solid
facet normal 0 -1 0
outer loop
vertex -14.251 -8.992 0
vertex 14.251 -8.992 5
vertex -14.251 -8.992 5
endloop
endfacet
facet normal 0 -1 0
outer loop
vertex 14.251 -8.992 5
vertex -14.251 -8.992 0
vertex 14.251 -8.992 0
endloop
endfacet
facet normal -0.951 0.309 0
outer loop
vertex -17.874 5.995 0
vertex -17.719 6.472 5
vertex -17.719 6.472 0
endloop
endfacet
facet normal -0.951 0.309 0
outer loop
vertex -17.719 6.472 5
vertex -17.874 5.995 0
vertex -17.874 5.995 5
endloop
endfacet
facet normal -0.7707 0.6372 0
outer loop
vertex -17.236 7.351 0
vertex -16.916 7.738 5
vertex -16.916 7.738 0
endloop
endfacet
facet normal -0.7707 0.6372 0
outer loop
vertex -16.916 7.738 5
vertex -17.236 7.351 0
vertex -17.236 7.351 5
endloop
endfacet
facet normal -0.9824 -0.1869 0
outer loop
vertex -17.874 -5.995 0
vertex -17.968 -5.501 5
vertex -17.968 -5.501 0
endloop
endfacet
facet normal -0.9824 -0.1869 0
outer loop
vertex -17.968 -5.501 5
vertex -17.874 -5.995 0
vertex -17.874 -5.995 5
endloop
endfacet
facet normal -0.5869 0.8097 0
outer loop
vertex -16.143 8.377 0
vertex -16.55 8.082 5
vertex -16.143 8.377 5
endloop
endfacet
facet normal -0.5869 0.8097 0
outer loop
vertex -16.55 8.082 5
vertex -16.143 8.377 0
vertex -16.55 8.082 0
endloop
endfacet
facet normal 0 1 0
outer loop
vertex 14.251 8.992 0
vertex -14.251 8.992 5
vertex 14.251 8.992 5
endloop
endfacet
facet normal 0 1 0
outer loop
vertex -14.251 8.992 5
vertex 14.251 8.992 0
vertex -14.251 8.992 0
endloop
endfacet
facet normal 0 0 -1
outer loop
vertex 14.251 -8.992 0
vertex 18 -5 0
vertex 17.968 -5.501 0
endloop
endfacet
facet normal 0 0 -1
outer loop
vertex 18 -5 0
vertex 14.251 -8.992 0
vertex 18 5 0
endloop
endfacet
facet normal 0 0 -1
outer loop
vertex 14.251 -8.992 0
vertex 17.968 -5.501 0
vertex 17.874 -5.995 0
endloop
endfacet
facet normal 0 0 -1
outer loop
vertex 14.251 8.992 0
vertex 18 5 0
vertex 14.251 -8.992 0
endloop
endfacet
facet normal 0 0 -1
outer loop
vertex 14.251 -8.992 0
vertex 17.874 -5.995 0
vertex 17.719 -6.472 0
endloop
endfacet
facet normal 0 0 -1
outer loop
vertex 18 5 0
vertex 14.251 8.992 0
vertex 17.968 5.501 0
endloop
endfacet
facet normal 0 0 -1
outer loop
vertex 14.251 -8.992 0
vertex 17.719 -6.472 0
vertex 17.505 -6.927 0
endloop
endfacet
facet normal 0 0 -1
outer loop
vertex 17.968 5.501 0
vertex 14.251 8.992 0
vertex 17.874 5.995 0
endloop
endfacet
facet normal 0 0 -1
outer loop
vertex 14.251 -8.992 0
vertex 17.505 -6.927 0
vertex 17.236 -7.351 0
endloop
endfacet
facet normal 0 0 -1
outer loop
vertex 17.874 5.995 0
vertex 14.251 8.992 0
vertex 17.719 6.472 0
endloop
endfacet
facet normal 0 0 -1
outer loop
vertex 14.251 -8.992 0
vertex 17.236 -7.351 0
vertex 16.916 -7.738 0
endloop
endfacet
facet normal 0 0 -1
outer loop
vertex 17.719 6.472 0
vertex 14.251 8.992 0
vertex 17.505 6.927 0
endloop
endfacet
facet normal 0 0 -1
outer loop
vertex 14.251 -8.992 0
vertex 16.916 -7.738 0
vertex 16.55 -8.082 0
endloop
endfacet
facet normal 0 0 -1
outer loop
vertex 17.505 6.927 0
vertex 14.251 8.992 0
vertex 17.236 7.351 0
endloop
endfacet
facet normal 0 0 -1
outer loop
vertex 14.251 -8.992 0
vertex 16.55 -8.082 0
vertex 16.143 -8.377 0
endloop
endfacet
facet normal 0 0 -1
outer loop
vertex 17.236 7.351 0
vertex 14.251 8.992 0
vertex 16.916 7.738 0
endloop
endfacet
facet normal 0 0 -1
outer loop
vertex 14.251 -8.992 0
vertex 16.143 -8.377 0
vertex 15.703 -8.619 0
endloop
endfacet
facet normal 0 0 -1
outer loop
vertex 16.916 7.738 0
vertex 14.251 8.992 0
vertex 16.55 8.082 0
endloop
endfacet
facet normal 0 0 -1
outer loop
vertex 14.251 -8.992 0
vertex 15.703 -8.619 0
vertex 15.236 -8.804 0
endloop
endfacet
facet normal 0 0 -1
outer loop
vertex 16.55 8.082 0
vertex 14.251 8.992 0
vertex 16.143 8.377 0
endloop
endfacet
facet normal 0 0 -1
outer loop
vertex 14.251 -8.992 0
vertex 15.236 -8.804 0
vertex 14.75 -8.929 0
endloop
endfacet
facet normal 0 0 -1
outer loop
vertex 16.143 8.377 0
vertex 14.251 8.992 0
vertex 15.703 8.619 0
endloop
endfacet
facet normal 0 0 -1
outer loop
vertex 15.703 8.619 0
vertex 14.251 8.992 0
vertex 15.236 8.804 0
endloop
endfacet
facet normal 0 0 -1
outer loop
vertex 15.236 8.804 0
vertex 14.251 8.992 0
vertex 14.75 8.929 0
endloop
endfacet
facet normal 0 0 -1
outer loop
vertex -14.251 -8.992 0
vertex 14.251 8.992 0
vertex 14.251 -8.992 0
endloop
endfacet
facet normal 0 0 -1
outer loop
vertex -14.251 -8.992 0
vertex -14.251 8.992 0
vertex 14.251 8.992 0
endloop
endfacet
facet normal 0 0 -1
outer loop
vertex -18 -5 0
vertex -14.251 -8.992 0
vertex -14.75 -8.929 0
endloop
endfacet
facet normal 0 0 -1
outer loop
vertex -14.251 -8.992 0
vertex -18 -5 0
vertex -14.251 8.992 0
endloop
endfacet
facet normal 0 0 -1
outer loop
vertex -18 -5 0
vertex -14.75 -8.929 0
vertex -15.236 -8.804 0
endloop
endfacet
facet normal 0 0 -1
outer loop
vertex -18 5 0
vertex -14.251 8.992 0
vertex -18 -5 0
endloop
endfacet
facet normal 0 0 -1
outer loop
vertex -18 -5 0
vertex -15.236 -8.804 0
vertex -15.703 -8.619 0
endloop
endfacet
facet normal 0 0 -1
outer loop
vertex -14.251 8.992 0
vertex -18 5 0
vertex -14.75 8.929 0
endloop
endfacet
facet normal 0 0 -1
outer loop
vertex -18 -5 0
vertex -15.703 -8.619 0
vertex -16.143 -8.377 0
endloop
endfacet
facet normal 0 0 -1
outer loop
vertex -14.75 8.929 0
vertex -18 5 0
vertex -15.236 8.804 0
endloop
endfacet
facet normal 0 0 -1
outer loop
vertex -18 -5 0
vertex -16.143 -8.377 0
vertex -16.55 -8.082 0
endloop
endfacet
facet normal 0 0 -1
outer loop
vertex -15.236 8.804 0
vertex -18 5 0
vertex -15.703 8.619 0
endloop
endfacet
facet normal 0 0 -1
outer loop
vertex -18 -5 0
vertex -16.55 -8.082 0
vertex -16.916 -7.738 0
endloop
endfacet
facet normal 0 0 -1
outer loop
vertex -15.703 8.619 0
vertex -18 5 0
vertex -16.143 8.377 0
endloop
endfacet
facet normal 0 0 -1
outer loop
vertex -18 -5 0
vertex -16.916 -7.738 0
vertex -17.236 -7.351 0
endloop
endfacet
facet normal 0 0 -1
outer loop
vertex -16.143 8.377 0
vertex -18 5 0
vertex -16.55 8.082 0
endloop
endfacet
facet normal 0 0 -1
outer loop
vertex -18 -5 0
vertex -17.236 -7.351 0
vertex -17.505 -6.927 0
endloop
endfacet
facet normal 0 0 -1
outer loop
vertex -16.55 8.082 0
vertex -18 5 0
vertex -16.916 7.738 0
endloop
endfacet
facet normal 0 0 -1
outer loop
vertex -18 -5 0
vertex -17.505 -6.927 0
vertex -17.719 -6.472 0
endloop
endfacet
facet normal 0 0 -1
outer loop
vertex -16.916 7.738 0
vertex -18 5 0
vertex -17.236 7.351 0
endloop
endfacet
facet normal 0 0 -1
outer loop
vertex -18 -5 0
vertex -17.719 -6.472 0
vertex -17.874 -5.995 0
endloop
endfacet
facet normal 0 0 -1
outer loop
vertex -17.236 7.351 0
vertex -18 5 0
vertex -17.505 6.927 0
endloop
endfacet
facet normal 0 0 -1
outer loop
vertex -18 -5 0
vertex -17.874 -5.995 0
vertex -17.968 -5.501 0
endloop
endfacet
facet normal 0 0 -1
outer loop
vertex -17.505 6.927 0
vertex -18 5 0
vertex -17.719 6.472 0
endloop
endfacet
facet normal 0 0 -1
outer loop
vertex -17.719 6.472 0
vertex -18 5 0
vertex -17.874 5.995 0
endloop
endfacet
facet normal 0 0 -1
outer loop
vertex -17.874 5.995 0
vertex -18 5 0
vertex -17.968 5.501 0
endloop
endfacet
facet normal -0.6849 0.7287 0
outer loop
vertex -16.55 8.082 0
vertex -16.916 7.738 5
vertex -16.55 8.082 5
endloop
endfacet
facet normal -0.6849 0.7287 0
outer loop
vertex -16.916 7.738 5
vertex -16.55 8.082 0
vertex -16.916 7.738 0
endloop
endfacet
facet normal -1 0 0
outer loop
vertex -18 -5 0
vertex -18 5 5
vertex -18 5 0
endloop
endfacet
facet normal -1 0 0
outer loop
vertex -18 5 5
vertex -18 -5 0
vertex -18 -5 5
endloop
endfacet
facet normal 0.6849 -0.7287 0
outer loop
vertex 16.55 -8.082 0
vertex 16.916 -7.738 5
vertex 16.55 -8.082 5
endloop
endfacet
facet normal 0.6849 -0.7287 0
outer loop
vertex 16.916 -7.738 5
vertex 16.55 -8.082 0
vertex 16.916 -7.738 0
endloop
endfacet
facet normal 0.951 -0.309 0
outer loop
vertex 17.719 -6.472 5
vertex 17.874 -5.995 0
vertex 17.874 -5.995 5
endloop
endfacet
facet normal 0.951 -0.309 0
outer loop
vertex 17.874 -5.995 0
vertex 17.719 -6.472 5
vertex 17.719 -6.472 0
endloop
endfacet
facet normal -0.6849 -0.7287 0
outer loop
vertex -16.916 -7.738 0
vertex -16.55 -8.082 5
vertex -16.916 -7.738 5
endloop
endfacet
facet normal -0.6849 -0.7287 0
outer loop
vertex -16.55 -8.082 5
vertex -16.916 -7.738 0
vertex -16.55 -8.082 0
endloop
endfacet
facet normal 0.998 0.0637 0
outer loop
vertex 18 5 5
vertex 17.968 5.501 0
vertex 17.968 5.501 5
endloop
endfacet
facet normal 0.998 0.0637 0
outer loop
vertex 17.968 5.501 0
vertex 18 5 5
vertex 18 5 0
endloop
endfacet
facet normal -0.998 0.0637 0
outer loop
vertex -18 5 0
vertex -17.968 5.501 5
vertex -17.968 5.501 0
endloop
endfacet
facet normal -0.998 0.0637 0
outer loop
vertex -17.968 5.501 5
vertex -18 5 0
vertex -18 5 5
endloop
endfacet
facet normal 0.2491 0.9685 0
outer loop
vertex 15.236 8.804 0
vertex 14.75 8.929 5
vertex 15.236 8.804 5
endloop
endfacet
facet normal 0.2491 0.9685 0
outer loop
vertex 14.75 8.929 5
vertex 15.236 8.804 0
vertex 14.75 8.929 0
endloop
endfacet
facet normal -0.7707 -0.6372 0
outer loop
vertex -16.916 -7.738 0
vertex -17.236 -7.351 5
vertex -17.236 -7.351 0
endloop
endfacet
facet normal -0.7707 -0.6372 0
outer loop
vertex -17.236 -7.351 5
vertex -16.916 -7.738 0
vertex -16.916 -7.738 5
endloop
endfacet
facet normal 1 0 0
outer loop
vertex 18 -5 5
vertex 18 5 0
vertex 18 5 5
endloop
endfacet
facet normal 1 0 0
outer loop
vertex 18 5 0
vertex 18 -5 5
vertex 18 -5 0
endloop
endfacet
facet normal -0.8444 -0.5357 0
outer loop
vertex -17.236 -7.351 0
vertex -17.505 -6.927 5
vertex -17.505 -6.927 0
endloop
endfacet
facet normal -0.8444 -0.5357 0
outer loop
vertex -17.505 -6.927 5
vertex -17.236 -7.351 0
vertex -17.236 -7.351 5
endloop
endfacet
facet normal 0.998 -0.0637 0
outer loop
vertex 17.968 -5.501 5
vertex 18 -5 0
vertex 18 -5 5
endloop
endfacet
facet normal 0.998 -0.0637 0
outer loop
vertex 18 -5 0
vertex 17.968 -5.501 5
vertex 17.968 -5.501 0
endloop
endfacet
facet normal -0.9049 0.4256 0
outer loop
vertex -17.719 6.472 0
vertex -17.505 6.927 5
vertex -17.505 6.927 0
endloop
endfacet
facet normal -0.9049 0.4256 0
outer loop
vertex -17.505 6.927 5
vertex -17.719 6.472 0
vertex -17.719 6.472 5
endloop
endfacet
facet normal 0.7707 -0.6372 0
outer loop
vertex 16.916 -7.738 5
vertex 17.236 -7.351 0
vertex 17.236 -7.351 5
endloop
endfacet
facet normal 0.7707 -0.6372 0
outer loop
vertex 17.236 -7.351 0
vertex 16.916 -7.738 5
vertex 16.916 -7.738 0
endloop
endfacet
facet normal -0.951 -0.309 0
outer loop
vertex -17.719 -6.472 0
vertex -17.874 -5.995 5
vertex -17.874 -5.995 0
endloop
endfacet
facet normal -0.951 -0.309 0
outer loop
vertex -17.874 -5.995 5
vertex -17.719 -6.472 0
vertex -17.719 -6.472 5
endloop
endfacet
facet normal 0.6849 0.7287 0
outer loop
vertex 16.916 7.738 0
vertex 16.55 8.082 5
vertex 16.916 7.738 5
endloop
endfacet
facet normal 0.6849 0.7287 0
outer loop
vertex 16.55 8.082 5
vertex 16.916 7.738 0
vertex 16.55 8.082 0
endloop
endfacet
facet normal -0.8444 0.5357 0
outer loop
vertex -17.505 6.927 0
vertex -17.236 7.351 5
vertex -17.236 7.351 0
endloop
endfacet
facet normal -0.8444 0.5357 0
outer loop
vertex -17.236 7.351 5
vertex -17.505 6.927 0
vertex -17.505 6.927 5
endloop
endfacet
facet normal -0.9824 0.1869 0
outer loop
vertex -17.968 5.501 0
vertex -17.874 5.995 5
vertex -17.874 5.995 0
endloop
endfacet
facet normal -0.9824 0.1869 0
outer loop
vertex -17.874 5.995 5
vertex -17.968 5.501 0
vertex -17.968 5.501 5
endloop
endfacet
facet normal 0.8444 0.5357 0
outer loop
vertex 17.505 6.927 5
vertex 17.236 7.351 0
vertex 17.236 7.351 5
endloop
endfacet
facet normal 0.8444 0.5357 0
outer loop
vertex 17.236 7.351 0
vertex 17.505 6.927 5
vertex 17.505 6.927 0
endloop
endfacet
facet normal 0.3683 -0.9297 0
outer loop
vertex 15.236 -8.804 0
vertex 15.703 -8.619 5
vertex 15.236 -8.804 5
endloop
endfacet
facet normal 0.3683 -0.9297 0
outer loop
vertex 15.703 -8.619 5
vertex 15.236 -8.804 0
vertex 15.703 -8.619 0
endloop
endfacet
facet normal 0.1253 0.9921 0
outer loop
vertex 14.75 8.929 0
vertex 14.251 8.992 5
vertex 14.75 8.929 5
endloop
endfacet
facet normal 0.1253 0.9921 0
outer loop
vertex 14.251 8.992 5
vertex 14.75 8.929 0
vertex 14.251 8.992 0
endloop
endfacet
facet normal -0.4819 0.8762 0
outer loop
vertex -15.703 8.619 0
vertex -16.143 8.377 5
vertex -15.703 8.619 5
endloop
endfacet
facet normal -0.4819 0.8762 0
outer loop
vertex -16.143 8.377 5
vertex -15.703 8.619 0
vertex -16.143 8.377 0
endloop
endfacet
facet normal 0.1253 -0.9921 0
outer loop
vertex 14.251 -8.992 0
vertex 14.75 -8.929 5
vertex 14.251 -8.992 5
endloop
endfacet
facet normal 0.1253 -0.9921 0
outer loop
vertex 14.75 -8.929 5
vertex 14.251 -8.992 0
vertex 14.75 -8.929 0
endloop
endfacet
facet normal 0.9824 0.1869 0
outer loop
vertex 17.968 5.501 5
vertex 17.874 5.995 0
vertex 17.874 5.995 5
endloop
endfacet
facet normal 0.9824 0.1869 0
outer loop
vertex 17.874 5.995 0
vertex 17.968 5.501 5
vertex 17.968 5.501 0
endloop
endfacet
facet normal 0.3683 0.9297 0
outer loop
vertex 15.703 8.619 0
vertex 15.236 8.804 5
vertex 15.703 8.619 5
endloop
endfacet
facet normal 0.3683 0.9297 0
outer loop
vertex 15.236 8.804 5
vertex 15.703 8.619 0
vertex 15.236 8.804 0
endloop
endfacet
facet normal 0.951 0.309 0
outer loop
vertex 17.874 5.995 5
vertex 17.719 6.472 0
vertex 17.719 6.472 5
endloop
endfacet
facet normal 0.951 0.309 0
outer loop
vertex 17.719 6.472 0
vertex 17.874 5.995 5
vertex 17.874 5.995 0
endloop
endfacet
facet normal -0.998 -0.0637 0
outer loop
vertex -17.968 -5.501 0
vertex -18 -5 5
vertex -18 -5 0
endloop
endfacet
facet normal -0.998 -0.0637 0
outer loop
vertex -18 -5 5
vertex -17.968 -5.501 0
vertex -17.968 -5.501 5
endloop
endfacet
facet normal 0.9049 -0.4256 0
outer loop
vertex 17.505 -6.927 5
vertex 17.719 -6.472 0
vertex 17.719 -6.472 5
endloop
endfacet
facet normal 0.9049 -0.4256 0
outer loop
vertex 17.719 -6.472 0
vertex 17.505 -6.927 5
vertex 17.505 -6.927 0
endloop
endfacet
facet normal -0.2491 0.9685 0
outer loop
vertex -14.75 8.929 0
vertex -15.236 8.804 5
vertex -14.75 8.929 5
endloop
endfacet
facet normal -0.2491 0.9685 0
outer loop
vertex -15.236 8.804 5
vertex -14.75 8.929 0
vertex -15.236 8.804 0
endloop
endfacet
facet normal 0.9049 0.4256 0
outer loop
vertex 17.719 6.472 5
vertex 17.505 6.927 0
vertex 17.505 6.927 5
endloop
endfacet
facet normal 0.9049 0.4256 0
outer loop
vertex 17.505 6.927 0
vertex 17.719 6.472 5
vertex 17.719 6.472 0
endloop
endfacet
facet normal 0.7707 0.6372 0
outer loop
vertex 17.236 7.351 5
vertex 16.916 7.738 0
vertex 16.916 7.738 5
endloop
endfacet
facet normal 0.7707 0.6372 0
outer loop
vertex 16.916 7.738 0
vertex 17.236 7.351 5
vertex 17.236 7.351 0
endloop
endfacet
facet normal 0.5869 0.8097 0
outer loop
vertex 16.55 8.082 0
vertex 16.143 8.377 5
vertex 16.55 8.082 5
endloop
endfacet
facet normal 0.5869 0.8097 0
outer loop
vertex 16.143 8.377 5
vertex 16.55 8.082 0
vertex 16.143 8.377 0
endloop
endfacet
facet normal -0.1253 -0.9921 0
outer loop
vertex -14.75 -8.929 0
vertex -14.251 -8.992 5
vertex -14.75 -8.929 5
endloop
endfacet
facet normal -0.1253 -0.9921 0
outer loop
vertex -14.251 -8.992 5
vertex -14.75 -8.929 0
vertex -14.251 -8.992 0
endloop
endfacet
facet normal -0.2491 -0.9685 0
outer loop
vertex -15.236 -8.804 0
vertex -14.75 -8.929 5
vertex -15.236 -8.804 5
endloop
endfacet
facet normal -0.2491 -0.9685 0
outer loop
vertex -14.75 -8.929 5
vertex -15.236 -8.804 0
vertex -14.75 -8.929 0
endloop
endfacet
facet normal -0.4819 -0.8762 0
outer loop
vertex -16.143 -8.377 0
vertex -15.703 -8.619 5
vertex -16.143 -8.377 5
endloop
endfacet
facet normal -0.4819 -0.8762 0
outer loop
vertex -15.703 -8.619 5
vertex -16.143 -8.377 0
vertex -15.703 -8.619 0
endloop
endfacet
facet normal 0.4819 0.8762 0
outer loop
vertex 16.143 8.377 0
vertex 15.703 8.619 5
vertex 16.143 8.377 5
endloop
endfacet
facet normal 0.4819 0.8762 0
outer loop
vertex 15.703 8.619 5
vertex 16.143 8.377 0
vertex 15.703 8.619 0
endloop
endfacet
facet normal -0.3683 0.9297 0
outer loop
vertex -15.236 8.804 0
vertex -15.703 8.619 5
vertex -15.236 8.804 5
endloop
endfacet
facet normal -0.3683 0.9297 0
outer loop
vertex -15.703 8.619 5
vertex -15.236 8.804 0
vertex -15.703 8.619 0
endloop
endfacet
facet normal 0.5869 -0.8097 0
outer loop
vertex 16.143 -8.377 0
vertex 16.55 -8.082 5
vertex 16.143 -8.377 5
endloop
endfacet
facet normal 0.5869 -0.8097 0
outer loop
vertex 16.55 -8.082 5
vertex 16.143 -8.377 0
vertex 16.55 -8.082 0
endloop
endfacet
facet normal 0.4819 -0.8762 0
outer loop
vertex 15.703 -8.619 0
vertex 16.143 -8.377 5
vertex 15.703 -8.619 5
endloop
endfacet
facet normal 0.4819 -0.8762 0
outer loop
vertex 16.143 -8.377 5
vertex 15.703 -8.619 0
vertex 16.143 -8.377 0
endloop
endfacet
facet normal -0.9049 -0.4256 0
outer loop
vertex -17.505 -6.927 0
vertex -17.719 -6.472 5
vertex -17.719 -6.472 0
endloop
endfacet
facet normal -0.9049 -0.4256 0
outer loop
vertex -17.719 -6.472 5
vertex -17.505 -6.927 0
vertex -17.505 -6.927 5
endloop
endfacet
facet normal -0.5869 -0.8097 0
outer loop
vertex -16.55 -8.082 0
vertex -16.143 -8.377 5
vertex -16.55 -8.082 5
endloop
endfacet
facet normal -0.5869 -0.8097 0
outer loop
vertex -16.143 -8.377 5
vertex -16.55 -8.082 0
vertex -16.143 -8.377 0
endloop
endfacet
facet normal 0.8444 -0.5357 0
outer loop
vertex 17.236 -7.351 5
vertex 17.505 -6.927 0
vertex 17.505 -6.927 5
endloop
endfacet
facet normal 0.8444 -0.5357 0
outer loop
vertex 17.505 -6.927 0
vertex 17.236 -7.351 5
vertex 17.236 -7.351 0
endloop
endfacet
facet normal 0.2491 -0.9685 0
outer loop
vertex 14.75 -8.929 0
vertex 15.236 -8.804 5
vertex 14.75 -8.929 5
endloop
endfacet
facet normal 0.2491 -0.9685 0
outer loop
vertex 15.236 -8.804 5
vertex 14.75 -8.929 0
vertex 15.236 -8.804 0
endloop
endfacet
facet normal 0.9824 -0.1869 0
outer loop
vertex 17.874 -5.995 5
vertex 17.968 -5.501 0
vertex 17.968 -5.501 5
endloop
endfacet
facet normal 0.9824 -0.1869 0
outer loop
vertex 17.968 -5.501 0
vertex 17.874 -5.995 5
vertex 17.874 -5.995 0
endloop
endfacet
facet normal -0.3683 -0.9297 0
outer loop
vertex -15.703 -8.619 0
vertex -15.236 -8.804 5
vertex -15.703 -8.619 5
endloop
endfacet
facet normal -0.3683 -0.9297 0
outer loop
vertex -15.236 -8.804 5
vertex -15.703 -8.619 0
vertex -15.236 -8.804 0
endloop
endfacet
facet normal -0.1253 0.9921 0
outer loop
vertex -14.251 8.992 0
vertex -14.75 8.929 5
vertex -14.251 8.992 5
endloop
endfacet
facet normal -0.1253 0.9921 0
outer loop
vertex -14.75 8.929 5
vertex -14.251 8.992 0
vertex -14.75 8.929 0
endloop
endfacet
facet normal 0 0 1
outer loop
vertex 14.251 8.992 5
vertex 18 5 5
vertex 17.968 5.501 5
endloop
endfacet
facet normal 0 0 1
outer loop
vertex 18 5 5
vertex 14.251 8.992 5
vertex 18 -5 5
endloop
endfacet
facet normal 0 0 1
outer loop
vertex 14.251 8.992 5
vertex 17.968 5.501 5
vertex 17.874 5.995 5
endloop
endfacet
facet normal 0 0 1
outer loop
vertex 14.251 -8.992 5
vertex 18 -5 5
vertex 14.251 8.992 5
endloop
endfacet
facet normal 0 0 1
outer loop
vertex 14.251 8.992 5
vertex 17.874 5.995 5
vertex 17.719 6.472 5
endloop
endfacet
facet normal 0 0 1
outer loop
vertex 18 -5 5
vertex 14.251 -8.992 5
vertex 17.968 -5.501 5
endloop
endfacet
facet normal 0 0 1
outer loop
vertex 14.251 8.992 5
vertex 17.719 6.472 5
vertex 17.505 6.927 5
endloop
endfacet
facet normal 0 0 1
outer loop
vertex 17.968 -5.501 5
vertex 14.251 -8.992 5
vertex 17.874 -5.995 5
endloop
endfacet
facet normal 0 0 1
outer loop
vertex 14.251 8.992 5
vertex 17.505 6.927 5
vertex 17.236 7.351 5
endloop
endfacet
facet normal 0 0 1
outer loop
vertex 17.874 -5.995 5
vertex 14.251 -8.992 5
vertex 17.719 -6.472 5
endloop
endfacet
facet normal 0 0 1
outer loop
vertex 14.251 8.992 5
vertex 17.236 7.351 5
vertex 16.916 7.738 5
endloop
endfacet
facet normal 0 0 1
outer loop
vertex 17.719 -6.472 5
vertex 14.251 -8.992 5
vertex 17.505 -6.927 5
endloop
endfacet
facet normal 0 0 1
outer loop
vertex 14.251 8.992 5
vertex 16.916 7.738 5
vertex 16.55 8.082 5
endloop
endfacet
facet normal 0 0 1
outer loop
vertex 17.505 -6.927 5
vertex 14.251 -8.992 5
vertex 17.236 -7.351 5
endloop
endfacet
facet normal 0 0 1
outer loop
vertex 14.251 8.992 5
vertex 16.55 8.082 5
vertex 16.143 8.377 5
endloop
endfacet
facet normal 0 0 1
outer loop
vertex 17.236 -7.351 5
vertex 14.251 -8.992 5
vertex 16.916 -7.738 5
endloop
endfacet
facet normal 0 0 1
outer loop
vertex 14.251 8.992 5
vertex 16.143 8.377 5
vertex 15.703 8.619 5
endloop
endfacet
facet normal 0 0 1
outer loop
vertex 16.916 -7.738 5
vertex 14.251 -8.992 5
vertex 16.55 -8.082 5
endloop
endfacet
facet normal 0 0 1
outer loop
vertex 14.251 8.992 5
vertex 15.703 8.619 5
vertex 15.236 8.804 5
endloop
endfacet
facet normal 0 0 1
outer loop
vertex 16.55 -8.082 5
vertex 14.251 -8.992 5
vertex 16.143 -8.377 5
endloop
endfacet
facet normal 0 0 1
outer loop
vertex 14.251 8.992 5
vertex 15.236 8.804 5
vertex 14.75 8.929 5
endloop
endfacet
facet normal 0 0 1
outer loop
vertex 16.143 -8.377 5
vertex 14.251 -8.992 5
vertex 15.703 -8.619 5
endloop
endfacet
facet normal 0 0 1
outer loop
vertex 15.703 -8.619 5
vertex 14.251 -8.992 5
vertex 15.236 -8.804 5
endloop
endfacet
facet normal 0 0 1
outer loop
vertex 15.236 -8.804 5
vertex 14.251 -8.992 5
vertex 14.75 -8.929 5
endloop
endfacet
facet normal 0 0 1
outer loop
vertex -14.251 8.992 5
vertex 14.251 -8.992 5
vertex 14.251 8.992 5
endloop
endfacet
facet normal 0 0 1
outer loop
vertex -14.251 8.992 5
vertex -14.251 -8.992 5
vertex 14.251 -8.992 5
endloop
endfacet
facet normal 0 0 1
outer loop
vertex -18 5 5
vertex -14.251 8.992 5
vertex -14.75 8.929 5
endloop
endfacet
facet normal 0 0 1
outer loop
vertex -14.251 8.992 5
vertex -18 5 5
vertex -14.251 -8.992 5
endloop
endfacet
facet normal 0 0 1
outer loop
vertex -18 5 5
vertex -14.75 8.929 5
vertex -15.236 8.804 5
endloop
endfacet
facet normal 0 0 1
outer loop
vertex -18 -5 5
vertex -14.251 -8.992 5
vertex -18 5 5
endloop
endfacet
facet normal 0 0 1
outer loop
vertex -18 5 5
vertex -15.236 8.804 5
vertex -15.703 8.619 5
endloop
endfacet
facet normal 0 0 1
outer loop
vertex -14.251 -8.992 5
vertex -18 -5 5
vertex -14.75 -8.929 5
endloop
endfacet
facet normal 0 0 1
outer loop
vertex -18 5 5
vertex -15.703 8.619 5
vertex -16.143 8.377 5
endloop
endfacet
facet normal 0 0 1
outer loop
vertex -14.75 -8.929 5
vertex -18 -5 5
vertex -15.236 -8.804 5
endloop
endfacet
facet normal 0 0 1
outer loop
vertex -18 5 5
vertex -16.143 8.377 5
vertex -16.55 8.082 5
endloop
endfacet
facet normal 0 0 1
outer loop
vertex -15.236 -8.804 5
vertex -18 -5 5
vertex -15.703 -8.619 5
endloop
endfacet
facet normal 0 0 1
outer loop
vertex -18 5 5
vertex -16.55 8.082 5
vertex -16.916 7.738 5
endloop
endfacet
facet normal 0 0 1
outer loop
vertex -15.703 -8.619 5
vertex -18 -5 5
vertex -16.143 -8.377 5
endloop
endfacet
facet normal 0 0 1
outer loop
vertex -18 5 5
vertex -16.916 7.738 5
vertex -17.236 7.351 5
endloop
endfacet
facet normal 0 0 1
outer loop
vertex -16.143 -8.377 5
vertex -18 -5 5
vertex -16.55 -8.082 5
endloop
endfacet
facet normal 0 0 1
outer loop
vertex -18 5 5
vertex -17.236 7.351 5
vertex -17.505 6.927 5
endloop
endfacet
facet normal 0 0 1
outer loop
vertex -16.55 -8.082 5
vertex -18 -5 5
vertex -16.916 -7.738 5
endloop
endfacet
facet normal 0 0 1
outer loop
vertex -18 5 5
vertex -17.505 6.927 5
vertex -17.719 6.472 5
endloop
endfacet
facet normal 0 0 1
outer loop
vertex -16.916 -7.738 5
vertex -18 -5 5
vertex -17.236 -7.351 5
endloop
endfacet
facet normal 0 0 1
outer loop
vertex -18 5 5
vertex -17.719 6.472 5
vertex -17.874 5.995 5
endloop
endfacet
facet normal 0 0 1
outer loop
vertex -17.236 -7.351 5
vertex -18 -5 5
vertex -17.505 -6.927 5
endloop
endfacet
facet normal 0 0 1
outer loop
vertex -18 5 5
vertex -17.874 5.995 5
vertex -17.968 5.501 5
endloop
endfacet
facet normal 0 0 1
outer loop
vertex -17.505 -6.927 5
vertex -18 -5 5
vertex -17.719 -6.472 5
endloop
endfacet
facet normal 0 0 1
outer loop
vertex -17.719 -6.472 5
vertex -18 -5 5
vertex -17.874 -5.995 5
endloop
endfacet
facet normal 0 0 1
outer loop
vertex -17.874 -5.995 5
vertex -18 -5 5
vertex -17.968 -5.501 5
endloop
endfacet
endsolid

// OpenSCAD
$fn = 50;

difference() {
	union() {
		hull() {
			translate(v = [-14.0, 5.0, 0]) {
				cylinder(h = 5, r = 4);
			}
			translate(v = [14.0, 5.0, 0]) {
				cylinder(h = 5, r = 4);
			}
			translate(v = [-14.0, -5.0, 0]) {
				cylinder(h = 5, r = 4);
			}
			translate(v = [14.0, -5.0, 0]) {
				cylinder(h = 5, r = 4);
			}
		}
	}
	union();
}
